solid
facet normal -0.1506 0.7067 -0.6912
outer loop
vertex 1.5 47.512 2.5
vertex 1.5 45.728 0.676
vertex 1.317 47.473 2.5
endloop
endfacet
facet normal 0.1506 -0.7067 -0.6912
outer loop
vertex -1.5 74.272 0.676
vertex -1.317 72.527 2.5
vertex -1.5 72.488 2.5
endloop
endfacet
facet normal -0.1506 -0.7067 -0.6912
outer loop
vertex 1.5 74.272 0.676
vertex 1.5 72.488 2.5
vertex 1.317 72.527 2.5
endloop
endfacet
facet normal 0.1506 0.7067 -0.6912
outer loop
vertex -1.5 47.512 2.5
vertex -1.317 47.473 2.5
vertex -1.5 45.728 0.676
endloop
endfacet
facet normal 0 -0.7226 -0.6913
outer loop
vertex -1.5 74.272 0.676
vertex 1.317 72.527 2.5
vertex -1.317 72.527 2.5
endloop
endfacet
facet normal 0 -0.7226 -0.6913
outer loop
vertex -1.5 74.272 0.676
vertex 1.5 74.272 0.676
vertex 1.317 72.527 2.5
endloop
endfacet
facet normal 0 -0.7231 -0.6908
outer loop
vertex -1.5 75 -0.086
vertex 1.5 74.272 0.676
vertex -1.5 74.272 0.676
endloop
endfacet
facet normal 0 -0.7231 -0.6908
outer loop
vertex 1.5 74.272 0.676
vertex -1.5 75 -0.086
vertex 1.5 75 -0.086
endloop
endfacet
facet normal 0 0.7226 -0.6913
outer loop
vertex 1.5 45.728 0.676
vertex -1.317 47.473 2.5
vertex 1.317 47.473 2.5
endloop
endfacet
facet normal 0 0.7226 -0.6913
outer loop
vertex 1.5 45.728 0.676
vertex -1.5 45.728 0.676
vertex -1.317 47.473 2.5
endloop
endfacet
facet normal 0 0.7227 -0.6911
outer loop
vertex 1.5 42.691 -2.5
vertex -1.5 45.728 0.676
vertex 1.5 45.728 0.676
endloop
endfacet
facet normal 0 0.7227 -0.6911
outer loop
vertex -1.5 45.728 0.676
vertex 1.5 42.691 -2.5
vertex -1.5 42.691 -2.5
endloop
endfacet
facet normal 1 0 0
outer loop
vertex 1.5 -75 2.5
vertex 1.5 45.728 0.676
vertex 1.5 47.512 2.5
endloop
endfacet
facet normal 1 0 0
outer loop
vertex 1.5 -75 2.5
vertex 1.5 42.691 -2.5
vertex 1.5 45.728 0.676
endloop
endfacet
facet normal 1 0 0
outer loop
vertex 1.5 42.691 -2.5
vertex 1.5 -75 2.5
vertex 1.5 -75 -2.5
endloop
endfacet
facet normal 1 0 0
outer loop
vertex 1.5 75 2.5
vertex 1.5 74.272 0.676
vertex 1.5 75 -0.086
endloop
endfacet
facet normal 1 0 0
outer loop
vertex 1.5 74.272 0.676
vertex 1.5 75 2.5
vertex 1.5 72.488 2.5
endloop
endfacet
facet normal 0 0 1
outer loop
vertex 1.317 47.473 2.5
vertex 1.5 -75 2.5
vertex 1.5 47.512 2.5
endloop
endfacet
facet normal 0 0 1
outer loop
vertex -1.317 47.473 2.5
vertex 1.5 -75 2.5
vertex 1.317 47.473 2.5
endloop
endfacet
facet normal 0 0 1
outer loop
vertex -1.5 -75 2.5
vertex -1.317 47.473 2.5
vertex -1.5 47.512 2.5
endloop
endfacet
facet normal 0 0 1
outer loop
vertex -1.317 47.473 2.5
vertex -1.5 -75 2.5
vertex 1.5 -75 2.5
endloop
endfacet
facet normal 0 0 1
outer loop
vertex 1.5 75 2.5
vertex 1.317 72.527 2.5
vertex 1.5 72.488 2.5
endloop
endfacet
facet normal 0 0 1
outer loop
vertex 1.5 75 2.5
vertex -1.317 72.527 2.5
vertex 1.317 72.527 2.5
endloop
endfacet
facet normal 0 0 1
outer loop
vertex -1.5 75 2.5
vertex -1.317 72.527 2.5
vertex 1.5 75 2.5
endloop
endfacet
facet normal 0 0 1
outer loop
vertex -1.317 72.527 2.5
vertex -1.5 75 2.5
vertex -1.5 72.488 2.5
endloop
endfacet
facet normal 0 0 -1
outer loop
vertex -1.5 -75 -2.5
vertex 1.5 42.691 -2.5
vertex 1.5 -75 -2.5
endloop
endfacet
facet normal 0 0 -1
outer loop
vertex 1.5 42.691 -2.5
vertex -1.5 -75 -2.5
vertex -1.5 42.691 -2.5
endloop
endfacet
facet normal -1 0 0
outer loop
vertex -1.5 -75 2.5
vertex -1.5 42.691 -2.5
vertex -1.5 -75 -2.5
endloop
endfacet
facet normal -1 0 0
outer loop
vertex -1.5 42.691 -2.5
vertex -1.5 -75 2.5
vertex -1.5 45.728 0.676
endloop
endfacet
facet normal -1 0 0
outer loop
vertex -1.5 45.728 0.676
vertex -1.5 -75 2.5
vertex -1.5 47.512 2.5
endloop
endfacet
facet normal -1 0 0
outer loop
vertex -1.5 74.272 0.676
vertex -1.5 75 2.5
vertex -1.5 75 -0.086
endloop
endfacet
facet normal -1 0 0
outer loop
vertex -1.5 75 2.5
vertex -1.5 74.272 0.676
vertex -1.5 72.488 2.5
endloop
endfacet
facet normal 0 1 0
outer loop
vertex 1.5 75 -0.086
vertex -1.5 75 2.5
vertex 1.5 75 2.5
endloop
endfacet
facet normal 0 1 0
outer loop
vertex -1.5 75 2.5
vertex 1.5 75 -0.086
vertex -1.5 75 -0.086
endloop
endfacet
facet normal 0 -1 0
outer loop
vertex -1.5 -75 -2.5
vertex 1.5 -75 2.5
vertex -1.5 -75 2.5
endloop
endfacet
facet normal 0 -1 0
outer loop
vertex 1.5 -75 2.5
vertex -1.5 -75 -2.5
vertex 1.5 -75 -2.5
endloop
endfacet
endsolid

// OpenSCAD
// file: plate_twin_lasers.scad
$fn=64;

plate_debth_new = 2.8;
plate_len = 120;
plate_width = 33;

//plate(plate_debth_new);

module plate(plate_debth){
    difference(){
        base(plate_debth);
        holes();
    } 
}

module holes(){
    cylinder(h = 40, d=6.5, center = true);
    
    translate([0,-plate_len/2,0])
    cylinder(h = 40, d=6.5, center = true);
    
    translate([0,plate_len/2,0])
    cylinder(h = 40, d=6.5, center = true);
}

module base(plate_debth){
    cube([plate_width,plate_len,plate_debth], center = true);
    //color("red")
    translate([0,-plate_len/2,0])
    cylinder(h=plate_debth, d=plate_width, center = true );
    //color("green")
    translate([0,plate_len/2,0])
    cylinder(h=plate_debth, d=plate_width, center = true );
}
// main file
use <plate_twin_lasers.scad>


plate_debth_new = 2.8;
plate_len = 120;
plate_width = 33;

//rib(rib_debth = 3,rib_height = 15.5);
rib_center_set(rib_debth=3, rib_height=5);
rib_edge(rib_debth=3,rib_height=4);
module rib_edge(rib_debth,rib_height){
    difference(){
        rib_center(rib_debth=3, rib_height=5);
        translate([0, plate_len/2,0])
        rotate([45,0,0])
        cube([10,40,30],center=true);
    }
}
module rib_center_set(rib_height, rib_debth){
    difference(){
        rib_center(rib_debth, rib_height);
        holes();
    }
}
module holes(){
    translate([0,0,-5])
    cylinder(d1=55, d2=5, h=25+1, center=true);
    
    translate([0, plate_len/2])
    cylinder(d1=55, d2=5, h=25+1, center=true);
    
    translate([0, -plate_len/2])
    cylinder(d1=55, d2=5, h=25+1, center=true);
}
module rib_center(rib_debth,rib_height){

    cube([rib_debth,,150,rib_height], center = true);
}

module rib(rib_debth,rib_height){
    difference(){
        //scale([1,1,rib_height])
        plate(plate_debth=rib_height);
        translate([0,0,0])
        //scale([1,1,rib_height])
        cube([plate_width-rib_debth,plate_len,rib_height+1], center = true);
        
        color("red")
        translate([0,-plate_len/2,0])
        //scale([1,1,rib_height])
        cylinder(h=rib_height+1, d=plate_width-rib_debth, center = true );
        
        color("green")
        translate([0,plate_len/2,0])
        //scale([1,1,rib_height])
        cylinder(h=rib_height+1, d=plate_width-rib_debth, center = true );
    }
}
